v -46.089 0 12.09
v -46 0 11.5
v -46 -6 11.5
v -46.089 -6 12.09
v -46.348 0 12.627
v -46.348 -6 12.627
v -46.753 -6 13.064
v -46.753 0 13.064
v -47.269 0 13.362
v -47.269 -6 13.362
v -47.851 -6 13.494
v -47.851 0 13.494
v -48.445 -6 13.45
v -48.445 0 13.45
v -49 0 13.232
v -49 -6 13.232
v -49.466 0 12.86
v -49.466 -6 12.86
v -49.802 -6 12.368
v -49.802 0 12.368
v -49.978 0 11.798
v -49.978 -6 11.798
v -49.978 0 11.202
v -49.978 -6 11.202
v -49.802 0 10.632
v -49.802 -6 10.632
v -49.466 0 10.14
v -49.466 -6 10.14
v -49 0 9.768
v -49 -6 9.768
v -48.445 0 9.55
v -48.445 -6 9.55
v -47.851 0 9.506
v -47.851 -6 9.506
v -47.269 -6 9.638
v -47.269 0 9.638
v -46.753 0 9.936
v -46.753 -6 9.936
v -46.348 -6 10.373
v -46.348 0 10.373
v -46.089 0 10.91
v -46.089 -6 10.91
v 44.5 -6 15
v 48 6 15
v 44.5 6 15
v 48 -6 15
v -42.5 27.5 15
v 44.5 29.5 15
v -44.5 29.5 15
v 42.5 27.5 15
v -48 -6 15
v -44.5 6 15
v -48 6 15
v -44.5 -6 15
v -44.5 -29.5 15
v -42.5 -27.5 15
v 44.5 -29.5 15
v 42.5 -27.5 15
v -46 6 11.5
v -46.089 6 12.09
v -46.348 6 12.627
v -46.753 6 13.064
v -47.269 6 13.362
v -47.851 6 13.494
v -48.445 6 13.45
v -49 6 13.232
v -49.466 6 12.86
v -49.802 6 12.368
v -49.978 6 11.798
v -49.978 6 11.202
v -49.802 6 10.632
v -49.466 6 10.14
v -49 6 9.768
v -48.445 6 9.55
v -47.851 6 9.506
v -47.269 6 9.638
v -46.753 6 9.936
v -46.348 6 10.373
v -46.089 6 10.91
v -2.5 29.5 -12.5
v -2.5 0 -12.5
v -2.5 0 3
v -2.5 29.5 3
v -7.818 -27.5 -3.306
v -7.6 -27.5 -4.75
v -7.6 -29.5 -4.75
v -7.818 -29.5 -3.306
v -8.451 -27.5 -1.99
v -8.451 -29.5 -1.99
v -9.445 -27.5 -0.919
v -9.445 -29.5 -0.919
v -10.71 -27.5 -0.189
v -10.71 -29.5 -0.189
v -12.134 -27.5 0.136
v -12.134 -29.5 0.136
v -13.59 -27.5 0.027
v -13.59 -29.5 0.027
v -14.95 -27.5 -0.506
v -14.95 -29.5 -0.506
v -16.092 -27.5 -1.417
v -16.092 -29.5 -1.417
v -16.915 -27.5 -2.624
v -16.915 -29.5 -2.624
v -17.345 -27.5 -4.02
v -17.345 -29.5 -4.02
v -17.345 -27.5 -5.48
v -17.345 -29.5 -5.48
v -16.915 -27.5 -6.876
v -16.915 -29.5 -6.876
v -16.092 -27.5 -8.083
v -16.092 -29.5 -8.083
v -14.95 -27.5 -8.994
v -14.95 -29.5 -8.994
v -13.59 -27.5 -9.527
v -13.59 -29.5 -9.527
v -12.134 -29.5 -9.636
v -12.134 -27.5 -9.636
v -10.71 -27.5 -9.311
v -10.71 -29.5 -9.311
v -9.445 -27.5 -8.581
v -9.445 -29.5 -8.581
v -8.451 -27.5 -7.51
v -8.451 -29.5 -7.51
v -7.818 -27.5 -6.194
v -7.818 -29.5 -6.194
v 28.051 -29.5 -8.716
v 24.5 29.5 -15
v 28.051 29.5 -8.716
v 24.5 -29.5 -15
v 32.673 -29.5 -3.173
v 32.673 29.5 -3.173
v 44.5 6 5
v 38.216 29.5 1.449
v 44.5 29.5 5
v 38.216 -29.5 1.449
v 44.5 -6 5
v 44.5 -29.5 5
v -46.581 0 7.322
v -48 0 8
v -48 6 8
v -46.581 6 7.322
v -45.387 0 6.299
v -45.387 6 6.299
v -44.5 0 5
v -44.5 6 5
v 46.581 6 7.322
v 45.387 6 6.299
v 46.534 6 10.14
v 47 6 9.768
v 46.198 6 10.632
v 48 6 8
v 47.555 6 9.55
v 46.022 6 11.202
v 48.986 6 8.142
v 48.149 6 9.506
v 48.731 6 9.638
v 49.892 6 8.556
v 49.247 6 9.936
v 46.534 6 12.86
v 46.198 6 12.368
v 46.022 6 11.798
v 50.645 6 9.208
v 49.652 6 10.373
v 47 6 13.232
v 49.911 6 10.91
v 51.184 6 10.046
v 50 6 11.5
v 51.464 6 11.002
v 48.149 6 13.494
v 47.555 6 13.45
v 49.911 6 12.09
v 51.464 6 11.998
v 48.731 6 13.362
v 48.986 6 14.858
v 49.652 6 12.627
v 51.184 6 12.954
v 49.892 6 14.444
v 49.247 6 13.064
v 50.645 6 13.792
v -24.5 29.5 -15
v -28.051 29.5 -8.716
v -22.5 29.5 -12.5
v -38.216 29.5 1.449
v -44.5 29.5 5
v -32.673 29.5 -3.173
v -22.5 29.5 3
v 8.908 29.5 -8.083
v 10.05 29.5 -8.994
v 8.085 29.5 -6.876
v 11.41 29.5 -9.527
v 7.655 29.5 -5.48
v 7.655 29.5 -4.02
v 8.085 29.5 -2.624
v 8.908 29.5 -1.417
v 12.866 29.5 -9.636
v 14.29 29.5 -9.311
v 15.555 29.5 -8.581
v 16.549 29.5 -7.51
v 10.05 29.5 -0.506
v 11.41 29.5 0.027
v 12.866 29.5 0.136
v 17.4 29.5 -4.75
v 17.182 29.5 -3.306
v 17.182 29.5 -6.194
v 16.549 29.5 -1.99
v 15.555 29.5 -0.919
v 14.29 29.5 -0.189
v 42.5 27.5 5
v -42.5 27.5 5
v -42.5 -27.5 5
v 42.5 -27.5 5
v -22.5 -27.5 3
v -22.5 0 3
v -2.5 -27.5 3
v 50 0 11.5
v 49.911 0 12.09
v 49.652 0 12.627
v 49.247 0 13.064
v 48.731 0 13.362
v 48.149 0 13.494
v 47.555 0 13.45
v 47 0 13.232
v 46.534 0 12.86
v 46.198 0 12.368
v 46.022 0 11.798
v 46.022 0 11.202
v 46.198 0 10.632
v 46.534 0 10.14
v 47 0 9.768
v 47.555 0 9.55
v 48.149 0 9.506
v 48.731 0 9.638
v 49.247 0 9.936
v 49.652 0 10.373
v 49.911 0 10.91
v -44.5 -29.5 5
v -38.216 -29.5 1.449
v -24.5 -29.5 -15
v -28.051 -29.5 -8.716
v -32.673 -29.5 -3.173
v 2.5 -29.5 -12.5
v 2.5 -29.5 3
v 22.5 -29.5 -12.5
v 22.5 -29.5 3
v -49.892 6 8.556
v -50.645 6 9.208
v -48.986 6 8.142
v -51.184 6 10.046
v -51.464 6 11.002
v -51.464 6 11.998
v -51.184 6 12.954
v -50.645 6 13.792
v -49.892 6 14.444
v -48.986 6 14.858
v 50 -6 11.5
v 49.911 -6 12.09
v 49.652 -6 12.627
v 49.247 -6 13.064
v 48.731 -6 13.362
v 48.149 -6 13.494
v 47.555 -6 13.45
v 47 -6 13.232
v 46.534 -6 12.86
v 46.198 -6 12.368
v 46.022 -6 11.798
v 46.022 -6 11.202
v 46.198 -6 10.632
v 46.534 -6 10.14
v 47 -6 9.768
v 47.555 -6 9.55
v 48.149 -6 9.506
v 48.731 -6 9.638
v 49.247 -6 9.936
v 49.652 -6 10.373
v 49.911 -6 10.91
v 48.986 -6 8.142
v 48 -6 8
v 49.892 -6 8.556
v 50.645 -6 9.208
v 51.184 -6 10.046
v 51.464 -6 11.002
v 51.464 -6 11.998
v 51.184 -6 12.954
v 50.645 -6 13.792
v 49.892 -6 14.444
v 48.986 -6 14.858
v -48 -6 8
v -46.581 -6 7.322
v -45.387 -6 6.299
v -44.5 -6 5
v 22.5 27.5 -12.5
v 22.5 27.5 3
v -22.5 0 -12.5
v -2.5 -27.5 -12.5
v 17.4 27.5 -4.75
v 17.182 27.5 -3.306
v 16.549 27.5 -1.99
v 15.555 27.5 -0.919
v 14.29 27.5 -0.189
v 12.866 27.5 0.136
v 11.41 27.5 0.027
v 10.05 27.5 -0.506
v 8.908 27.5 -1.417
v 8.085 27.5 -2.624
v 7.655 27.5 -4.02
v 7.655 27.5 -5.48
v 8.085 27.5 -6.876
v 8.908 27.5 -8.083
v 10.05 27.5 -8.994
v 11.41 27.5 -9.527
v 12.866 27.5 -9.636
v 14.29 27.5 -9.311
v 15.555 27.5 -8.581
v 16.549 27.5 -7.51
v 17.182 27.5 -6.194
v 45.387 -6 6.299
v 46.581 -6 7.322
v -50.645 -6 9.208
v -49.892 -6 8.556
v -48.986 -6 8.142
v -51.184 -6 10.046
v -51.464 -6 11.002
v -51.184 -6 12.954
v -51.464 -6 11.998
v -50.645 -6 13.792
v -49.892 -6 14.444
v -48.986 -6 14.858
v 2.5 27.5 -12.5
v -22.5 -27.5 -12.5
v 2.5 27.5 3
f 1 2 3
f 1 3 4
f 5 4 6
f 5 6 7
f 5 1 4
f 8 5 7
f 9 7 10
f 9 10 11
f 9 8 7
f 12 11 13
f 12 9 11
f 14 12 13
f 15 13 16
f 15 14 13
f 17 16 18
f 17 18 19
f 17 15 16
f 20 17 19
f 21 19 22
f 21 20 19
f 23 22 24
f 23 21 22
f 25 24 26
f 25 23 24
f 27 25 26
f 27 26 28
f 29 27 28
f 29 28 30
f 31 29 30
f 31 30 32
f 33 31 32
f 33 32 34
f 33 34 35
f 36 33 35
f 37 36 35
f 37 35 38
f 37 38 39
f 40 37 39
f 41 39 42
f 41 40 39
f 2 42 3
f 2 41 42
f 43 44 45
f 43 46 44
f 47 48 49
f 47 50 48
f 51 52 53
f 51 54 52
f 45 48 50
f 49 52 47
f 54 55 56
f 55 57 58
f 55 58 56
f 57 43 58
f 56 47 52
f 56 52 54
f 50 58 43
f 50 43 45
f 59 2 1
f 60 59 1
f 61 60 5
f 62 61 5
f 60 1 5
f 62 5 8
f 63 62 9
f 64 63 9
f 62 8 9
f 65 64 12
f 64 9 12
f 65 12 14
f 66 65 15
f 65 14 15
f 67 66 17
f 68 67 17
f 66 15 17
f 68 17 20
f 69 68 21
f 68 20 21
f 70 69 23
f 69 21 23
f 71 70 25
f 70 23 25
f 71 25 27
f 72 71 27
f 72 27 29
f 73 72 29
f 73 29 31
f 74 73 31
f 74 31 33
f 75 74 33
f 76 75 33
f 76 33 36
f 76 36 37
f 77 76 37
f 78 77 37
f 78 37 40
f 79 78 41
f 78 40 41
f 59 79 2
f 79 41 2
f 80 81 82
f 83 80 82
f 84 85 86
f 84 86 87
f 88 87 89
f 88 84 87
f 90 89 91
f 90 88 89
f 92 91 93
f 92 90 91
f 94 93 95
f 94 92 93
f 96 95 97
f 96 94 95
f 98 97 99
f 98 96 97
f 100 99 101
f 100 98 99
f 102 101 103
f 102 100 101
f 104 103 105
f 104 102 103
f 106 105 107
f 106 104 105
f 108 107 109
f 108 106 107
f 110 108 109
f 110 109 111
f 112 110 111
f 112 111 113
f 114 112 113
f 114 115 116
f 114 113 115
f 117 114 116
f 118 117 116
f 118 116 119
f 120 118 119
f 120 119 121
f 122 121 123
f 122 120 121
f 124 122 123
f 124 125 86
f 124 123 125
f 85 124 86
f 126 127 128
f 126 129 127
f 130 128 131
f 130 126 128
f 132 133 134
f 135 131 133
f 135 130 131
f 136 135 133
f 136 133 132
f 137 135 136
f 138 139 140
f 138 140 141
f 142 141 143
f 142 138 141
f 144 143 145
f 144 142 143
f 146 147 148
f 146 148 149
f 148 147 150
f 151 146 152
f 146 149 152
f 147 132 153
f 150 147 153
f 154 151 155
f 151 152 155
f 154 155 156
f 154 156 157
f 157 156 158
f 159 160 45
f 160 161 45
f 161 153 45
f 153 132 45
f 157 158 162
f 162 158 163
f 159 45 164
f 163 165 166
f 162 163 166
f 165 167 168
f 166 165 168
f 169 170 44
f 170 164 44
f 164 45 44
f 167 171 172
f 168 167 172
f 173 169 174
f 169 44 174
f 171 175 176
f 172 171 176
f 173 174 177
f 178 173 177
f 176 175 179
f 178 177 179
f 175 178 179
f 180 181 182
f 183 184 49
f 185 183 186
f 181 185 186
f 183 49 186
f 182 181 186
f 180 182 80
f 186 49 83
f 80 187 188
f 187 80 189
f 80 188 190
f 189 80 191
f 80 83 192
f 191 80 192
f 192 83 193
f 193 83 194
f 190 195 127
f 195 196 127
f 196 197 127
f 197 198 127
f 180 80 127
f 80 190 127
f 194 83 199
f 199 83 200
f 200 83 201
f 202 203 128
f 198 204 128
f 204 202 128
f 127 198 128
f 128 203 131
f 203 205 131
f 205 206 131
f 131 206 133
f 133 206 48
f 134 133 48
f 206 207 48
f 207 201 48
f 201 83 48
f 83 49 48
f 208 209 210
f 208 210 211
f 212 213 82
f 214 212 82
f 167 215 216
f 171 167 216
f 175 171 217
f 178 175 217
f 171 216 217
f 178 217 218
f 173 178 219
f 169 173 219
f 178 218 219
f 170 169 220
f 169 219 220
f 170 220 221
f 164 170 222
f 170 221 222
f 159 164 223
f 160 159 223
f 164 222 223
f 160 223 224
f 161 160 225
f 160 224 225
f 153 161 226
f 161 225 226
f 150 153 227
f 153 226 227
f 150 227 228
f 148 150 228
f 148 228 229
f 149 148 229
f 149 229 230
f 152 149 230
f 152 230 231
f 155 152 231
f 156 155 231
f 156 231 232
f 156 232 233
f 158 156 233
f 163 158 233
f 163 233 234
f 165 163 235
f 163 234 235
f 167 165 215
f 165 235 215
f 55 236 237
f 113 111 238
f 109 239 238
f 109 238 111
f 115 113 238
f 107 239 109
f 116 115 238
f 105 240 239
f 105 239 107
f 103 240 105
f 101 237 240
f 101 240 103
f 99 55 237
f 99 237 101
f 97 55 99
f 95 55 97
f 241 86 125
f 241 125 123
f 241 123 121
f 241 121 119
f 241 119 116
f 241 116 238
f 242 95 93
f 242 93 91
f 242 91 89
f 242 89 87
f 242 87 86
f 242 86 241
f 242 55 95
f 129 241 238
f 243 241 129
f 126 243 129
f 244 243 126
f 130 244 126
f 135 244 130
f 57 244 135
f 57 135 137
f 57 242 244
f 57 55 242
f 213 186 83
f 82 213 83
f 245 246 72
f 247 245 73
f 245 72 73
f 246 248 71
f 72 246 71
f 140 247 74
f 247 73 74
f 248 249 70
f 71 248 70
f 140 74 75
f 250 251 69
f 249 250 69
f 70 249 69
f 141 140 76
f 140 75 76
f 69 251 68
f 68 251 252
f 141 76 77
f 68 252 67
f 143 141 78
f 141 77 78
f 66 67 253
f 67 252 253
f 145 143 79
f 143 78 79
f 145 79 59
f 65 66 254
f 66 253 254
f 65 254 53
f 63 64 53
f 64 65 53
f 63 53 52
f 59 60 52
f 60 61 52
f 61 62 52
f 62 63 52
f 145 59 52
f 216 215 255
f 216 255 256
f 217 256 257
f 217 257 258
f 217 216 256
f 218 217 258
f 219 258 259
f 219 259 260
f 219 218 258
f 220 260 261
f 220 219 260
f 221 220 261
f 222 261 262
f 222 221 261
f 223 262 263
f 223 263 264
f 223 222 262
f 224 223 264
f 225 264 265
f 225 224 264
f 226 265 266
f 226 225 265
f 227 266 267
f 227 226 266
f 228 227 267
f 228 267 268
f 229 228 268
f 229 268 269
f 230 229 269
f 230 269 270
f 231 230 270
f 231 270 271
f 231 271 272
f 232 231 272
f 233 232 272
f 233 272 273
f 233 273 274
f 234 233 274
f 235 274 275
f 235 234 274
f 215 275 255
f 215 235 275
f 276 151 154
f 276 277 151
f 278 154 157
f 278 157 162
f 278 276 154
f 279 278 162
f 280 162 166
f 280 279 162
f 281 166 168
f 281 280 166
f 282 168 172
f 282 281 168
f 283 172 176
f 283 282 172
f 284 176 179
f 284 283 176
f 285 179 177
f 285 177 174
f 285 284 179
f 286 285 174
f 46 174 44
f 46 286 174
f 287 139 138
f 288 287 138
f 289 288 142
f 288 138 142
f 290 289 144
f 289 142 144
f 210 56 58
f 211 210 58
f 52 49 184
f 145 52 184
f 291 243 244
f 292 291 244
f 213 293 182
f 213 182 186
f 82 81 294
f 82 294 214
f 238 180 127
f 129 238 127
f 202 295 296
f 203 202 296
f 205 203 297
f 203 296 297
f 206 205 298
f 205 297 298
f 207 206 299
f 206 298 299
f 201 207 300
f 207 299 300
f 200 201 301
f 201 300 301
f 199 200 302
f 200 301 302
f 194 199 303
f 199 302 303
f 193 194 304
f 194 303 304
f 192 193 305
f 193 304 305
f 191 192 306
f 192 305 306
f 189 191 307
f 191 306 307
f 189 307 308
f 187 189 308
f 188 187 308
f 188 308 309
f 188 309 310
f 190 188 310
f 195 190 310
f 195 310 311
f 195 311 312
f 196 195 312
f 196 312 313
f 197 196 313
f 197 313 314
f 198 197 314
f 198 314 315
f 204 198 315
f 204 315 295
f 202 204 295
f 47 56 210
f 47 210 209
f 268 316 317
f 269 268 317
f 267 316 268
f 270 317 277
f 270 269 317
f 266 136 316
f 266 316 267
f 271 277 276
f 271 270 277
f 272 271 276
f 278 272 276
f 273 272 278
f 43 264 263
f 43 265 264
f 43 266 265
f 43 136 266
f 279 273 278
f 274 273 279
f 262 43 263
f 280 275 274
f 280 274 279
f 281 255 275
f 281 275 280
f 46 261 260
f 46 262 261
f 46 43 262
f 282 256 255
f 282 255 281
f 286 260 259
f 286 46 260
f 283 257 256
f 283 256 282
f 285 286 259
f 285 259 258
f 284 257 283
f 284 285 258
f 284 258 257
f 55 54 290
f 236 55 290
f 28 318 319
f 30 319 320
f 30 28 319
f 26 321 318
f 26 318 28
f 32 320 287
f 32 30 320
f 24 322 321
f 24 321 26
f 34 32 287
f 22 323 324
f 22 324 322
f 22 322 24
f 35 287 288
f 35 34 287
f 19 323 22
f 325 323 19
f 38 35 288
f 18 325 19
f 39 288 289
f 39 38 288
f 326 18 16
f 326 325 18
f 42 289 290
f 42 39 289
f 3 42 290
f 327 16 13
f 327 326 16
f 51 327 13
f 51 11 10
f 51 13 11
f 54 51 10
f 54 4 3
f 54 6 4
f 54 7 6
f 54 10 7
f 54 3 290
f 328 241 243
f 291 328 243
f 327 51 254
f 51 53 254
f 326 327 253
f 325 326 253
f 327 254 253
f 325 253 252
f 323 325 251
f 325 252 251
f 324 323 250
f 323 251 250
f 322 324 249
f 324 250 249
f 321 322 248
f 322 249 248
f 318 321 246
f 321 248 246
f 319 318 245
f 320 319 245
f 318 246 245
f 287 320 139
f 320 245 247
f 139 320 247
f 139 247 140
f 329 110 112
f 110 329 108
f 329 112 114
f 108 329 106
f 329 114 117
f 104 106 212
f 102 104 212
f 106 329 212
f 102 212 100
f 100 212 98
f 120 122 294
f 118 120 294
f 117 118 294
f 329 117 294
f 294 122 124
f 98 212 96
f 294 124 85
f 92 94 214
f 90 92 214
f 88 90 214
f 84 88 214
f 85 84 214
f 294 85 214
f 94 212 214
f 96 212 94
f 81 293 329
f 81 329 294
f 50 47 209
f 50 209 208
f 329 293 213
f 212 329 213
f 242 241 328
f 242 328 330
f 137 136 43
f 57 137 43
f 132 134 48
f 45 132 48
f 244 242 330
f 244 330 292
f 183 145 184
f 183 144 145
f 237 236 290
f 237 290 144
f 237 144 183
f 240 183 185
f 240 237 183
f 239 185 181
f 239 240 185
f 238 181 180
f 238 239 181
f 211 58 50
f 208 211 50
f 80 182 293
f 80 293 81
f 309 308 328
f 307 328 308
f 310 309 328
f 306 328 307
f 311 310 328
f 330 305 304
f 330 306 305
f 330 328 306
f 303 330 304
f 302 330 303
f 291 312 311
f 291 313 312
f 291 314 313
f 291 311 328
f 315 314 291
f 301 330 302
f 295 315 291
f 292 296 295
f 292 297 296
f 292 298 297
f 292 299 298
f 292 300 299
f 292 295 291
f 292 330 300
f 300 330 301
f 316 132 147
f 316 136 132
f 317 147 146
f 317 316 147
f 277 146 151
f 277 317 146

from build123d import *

# Parameters (mm, degrees)
F1_DEPTH       = 29.5
F1_DEPTH_BACK  = 29.5
F2_R           = 2
F3_DEPTH       = 6
F3_DEPTH_BACK  = 6
F4_W           = 85
F4_H           = 55
F5_DEPTH       = 10
F6_W           = 20
F6_H           = 15.5
F7_DEPTH       = 29.5
F7_DEPTH_BACK  = 27.5
F8_W           = 20
F8_H           = 15.5
F9_DEPTH       = 57
F10_R          = 4.9
F11_DEPTH      = 80
F11_DEPTH_BACK = 80


with BuildPart() as f1:
    # F0 (on Front) → F1 (new body, two sides)
    with BuildSketch(Plane.XZ) as f1_sk:
        with BuildLine():
            Line((44.5, 15), (-44.5, 15))
            Line((-44.5, 15), (-44.5, 5))
            ThreePointArc((-44.5, 5), (-32.6732418632, -3.1732418632), (-24.5, -15))
            Line((-24.5, -15), (0, -15))
            Line((0, -15), (24.5, -15))
            ThreePointArc((24.5, -15), (32.6732418632, -3.1732418632), (44.5, 5))
            Line((44.5, 5), (44.5, 15))
        make_face()
    extrude(amount=F1_DEPTH)
    extrude(f1_sk.sketch, amount=-F1_DEPTH_BACK)

    # F2 (on Front) → F3 (join, two sides)
    with BuildSketch(Plane.XZ) as f3_sk:
        with BuildLine():
            Line((48, 15), (44.5, 15))
            Line((44.5, 15), (44.5, 5))
            ThreePointArc((44.5, 5), (45.9503951439, 6.8495389988), (48, 8))
            ThreePointArc((48, 8), (51.5, 11.5), (48, 15))
        make_face()
        with Locations((48, 11.5)):
            Circle(F2_R, mode=Mode.SUBTRACT)
        with BuildLine():
            Line((-44.5, 5), (-44.5, 15))
            Line((-44.5, 15), (-48, 15))
            ThreePointArc((-48, 15), (-51.5, 11.5), (-48, 8))
            ThreePointArc((-48, 8), (-45.9503951439, 6.8495389988), (-44.5, 5))
        make_face()
        with Locations((-48, 11.5)):
            Circle(F2_R, mode=Mode.SUBTRACT)
    extrude(amount=F3_DEPTH)
    extrude(f3_sk.sketch, amount=-F3_DEPTH_BACK)

    # F4 (on face) → F5 (cut)
    with BuildSketch(Plane.XY.offset(15)):
        Rectangle(F4_W, F4_H)
    extrude(amount=-F5_DEPTH, mode=Mode.SUBTRACT)

    # F6 (on Front) → F7 (cut, two sides)
    with BuildSketch(Plane.XZ) as f7_sk:
        with Locations((-12.5, -4.75)):
            Rectangle(F6_W, F6_H)
    extrude(amount=-F7_DEPTH, mode=Mode.SUBTRACT)
    extrude(f7_sk.sketch, amount=F7_DEPTH_BACK, mode=Mode.SUBTRACT)

    # F8 (on face) → F9 (cut)
    with BuildSketch(Plane.XZ.offset(29.5)):
        with Locations((12.5, -4.75)):
            Rectangle(F8_W, F8_H)
    extrude(amount=-F9_DEPTH, mode=Mode.SUBTRACT)

    # F10 (on Front) → F11 (cut, two sides)
    with BuildSketch(Plane.XZ) as f11_sk:
        with Locations((-12.5, -4.75)):
            Circle(F10_R)
        with Locations((12.5, -4.75)):
            Circle(F10_R)
    extrude(amount=-F11_DEPTH, mode=Mode.SUBTRACT)
    extrude(f11_sk.sketch, amount=F11_DEPTH_BACK, mode=Mode.SUBTRACT)


solid = f1.part
